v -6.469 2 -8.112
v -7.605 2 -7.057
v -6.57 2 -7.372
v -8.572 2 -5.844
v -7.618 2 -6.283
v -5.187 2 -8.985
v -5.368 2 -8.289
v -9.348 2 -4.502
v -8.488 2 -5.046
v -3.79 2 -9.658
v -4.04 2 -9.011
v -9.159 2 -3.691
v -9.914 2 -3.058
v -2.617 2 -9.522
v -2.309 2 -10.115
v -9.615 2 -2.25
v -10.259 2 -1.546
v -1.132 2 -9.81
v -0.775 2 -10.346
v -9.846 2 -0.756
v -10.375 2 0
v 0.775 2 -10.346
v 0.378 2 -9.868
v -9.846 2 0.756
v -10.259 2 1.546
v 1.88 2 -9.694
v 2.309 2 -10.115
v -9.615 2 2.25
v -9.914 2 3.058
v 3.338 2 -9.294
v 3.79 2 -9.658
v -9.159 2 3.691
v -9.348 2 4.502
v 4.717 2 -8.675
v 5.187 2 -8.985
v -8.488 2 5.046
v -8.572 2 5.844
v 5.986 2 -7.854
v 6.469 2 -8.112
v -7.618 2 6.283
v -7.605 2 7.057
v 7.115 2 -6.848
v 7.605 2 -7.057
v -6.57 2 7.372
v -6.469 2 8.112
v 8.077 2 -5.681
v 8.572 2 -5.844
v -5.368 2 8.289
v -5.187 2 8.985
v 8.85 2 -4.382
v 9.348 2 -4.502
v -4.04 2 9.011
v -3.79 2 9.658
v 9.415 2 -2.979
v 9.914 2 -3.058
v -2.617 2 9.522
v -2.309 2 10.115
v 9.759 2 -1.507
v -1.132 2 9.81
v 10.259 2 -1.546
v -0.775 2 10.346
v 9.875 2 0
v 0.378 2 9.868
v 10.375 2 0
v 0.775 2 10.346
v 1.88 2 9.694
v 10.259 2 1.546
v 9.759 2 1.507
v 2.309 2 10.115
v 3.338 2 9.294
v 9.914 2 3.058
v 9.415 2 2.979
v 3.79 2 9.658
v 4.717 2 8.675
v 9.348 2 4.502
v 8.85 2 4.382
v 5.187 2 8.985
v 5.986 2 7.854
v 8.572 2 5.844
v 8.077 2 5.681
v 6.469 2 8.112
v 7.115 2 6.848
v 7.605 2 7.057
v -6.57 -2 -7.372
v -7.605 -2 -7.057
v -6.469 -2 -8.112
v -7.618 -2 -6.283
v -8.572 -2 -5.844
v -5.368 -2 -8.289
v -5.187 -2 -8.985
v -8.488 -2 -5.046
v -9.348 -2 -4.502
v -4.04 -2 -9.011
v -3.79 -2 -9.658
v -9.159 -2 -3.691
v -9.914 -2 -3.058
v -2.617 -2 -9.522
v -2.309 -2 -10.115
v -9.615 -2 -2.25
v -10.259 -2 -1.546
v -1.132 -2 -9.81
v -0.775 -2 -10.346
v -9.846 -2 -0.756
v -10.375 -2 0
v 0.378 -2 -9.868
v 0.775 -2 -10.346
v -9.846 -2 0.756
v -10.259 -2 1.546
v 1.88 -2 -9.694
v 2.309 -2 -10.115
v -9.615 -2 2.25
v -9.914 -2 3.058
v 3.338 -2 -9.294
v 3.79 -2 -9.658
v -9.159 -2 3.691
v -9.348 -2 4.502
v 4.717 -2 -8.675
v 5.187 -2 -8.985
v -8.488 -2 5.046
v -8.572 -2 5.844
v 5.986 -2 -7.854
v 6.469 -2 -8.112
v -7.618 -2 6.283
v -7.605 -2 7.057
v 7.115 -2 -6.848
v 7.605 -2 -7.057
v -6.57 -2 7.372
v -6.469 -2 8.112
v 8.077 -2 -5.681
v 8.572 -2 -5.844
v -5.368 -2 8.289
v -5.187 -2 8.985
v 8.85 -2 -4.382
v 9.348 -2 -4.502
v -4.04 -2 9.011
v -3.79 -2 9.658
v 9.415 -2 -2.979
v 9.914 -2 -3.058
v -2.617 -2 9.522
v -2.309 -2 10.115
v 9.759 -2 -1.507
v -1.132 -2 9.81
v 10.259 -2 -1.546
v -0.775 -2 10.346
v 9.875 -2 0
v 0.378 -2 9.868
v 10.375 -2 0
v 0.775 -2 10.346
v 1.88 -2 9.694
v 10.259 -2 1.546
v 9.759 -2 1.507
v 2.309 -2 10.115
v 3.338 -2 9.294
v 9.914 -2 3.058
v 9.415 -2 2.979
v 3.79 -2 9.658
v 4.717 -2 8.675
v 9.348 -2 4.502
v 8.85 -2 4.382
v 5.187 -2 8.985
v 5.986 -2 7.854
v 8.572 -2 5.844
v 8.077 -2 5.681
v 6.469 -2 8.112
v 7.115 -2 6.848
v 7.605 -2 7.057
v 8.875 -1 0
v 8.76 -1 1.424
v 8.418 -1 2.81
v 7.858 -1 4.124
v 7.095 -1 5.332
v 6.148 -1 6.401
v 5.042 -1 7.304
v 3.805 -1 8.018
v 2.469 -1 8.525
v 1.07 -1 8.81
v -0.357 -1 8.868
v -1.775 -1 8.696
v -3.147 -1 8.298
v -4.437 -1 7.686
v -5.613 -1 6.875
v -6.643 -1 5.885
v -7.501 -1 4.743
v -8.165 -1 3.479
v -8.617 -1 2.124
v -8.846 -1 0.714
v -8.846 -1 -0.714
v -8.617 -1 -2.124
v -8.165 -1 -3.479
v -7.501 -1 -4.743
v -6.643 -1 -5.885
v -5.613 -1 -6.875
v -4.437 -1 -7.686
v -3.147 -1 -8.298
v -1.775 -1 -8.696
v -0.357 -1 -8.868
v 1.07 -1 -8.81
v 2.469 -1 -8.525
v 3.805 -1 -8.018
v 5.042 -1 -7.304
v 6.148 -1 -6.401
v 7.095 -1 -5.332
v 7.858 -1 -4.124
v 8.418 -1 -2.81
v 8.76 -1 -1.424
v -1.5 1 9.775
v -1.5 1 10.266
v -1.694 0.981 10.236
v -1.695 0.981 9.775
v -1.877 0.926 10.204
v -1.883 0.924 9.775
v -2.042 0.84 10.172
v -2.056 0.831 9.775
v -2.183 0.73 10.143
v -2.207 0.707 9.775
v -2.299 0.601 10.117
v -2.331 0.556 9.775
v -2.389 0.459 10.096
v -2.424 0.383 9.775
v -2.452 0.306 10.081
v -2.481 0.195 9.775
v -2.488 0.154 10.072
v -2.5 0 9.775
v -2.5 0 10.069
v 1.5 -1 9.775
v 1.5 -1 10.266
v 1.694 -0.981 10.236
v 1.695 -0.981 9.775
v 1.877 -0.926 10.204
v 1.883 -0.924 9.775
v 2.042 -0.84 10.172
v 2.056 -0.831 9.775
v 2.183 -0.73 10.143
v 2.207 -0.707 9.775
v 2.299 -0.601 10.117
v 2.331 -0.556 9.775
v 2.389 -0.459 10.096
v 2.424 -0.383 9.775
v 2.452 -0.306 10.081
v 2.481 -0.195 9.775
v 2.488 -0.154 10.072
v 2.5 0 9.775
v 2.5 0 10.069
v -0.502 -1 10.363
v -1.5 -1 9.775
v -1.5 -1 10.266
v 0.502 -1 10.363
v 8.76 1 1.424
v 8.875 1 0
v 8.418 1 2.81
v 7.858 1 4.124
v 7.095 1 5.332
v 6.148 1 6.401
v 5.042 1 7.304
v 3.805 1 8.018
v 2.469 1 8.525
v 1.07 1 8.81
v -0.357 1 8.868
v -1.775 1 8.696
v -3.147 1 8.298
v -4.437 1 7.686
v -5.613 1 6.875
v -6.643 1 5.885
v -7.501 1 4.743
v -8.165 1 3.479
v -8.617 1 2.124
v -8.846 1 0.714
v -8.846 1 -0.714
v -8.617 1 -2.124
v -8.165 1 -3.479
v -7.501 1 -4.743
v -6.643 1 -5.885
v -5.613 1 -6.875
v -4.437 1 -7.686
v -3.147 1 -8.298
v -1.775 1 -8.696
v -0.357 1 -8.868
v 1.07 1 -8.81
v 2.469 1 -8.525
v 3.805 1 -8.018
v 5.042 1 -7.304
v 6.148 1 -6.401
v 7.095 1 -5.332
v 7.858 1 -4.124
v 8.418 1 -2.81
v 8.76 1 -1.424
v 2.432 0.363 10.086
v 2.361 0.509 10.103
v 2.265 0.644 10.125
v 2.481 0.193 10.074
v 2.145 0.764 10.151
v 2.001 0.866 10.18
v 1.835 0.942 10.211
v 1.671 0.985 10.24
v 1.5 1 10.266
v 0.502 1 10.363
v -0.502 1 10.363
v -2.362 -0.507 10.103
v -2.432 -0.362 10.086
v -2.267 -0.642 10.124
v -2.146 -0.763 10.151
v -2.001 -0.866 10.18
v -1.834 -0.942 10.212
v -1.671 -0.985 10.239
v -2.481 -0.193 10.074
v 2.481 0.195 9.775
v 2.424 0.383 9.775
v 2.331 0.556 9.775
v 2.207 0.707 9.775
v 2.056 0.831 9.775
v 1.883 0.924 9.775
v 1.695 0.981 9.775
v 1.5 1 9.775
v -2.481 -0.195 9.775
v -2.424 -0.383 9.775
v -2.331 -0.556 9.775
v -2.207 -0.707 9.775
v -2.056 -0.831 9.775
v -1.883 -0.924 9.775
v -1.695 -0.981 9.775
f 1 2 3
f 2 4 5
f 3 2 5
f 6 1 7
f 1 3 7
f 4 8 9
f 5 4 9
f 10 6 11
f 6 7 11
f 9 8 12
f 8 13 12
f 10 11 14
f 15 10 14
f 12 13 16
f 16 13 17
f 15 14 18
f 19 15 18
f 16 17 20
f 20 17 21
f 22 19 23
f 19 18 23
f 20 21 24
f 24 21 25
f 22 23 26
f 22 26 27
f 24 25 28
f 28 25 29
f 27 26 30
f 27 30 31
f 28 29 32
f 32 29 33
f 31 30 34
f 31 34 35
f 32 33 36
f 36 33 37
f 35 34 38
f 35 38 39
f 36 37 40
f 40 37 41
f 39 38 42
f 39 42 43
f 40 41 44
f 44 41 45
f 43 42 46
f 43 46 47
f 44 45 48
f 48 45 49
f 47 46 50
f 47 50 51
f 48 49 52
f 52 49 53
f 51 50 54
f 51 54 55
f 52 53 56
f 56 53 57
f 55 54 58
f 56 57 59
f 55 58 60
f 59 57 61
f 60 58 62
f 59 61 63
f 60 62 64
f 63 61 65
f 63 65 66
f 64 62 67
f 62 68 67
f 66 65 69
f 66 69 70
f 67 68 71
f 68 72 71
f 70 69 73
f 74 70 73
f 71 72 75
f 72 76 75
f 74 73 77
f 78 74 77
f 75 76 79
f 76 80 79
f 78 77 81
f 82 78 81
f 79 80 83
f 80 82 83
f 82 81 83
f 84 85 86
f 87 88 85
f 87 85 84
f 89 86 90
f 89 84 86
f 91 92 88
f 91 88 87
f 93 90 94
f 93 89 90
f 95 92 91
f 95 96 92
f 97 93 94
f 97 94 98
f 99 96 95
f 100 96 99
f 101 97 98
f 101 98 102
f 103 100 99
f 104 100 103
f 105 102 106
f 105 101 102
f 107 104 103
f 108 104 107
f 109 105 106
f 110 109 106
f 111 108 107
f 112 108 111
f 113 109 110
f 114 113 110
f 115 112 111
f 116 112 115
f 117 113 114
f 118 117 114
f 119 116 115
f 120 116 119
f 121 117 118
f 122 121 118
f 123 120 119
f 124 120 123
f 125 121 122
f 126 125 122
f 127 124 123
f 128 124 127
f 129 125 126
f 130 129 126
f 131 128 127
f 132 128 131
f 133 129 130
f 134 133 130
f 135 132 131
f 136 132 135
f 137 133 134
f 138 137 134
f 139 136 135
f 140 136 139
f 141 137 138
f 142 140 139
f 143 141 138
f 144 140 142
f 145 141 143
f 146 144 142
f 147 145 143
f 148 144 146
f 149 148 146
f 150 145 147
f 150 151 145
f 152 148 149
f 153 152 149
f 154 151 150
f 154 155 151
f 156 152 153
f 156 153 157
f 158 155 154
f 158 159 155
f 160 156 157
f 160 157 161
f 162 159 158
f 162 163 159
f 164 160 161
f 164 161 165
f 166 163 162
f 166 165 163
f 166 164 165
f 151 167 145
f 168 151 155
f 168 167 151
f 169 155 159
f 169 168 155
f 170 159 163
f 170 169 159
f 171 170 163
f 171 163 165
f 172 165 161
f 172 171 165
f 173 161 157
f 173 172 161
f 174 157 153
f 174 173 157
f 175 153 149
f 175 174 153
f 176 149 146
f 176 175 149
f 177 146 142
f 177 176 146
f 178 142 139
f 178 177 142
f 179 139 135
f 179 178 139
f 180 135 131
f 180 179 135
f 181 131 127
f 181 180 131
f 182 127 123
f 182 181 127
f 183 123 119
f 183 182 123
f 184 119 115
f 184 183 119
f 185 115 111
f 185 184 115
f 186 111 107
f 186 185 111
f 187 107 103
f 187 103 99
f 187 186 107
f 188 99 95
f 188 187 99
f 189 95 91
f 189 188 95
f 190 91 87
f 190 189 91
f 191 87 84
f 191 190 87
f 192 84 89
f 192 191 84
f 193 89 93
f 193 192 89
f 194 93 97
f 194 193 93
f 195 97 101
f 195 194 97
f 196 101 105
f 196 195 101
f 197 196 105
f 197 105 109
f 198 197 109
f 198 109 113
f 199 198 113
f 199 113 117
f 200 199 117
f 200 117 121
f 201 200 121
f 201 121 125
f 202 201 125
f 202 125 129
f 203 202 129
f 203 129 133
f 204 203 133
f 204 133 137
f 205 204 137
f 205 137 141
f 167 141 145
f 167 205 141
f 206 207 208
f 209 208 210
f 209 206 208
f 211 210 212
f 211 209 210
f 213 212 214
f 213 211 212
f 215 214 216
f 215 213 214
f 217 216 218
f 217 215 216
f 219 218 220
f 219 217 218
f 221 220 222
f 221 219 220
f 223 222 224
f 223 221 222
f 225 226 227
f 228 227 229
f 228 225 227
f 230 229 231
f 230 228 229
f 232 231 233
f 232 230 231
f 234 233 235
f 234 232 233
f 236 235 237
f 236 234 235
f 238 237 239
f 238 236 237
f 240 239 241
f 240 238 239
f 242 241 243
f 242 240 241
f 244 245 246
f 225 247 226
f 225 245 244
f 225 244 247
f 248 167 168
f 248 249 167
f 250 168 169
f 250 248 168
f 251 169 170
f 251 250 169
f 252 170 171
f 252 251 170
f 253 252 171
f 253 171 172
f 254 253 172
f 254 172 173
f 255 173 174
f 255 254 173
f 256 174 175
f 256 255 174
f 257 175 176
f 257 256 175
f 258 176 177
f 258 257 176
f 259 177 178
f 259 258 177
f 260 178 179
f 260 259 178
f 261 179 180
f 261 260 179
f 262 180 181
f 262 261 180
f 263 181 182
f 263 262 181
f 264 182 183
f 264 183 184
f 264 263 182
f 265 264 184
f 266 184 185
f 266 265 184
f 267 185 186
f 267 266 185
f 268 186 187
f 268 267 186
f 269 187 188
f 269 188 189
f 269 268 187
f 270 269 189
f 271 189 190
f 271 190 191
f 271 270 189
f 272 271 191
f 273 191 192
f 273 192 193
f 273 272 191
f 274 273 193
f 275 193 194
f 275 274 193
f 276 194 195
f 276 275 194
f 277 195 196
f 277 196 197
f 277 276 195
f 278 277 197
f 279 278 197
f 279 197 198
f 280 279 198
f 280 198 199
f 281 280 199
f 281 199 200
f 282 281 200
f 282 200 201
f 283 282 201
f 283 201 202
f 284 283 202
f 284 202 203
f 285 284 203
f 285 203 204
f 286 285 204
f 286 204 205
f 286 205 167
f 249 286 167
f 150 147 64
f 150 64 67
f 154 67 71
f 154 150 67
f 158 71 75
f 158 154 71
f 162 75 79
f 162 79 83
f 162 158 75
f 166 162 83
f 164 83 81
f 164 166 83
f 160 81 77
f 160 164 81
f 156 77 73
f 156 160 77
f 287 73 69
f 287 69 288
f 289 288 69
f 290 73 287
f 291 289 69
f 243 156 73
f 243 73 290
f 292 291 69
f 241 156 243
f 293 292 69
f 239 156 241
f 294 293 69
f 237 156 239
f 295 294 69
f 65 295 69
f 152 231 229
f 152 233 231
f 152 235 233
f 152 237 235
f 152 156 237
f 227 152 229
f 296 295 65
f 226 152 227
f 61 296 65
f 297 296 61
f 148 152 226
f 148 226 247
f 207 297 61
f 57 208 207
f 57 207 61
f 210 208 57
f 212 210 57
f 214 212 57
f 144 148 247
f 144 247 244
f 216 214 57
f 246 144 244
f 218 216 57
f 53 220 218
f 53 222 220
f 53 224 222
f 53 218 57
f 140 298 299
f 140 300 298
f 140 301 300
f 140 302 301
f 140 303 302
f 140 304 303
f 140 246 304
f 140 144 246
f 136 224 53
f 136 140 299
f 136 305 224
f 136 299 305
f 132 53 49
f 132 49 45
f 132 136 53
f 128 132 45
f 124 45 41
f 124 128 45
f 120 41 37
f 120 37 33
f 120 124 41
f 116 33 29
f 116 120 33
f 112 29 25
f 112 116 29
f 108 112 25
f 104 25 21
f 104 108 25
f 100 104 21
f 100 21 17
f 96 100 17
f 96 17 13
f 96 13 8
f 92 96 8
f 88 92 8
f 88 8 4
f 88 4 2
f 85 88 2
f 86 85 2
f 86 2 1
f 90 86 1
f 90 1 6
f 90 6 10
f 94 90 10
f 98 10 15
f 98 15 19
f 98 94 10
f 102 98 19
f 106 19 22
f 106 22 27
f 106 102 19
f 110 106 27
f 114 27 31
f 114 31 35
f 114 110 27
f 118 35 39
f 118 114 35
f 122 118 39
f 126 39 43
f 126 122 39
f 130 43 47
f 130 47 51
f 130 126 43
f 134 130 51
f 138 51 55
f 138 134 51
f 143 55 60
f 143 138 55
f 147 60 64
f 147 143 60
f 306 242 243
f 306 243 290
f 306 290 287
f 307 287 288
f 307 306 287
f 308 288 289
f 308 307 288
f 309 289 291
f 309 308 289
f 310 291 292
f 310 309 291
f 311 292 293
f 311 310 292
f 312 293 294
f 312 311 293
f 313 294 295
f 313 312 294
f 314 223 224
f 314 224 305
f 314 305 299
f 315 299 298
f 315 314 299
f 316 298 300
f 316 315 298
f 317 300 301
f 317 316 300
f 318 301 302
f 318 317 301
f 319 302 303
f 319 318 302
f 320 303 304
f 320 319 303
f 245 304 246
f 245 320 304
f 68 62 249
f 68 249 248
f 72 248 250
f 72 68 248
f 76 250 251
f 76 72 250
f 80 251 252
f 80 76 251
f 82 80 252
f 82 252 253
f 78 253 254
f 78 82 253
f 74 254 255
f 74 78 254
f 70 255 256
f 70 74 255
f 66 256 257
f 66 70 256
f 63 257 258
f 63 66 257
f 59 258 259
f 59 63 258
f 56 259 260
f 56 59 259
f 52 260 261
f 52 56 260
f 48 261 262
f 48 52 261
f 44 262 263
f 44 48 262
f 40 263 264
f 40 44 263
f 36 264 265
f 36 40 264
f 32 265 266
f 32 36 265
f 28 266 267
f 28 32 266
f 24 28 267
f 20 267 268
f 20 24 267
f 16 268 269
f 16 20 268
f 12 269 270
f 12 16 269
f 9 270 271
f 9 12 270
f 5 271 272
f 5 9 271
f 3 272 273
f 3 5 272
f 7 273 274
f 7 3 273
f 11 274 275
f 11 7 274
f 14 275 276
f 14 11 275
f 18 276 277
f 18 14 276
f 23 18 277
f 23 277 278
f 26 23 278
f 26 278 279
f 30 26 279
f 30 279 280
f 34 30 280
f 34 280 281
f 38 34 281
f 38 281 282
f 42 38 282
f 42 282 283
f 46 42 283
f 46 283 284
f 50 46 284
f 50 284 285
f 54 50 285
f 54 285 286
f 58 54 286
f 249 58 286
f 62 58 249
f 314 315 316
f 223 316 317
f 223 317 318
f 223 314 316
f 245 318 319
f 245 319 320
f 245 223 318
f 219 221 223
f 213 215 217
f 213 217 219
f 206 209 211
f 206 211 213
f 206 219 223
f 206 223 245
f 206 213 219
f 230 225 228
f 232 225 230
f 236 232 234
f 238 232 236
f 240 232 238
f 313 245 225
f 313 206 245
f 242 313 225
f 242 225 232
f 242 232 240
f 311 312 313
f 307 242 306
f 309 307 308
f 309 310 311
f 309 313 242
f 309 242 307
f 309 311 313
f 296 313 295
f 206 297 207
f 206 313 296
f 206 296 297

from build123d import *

# Parameters (mm, degrees)
F0_R          = 10.375
F0_R_2        = 8.875
F1_DEPTH      = 2
F1_DEPTH_BACK = 2
F2_SIZE       = 1
F4_START      = 9.775
F3_R          = 0.75
F4_DEPTH      = 15.225


with BuildPart() as f1:
    # F0 (on Front) → F1 (new body, two sides)
    with BuildSketch(Plane.XZ) as f1_sk:
        Circle(F0_R)
        Circle(F0_R_2, mode=Mode.SUBTRACT)
    extrude(amount=F1_DEPTH)
    extrude(f1_sk.sketch, amount=-F1_DEPTH_BACK)

    # F2
    f2_edges = [f1.edges().sort_by_distance(p)[0] for p in [
        (-8.875, -2, 0),
        (-8.875, 2, 0),
    ]]
    chamfer(f2_edges, length=F2_SIZE)

    # F3 (on Top) → F4 (cut)
    with BuildSketch(Plane.XY.offset(F4_START)):
        with BuildLine():
            Line((-1.5, -1), (1.5, -1))
            ThreePointArc((1.5, -1), (2.2071067812, -0.7071067812), (2.5, 0))
            ThreePointArc((2.5, 0), (2.2071067812, 0.7071067812), (1.5, 1))
            Line((1.5, 1), (-1.5, 1))
            ThreePointArc((-1.5, 1), (-2.2071067812, 0.7071067812), (-2.5, 0))
            ThreePointArc((-2.5, 0), (-2.2071067812, -0.7071067812), (-1.5, -1))
        make_face()
        Circle(F3_R, mode=Mode.SUBTRACT)
        Circle(F3_R)
    extrude(amount=F4_DEPTH, mode=Mode.SUBTRACT)


solid = f1.part
